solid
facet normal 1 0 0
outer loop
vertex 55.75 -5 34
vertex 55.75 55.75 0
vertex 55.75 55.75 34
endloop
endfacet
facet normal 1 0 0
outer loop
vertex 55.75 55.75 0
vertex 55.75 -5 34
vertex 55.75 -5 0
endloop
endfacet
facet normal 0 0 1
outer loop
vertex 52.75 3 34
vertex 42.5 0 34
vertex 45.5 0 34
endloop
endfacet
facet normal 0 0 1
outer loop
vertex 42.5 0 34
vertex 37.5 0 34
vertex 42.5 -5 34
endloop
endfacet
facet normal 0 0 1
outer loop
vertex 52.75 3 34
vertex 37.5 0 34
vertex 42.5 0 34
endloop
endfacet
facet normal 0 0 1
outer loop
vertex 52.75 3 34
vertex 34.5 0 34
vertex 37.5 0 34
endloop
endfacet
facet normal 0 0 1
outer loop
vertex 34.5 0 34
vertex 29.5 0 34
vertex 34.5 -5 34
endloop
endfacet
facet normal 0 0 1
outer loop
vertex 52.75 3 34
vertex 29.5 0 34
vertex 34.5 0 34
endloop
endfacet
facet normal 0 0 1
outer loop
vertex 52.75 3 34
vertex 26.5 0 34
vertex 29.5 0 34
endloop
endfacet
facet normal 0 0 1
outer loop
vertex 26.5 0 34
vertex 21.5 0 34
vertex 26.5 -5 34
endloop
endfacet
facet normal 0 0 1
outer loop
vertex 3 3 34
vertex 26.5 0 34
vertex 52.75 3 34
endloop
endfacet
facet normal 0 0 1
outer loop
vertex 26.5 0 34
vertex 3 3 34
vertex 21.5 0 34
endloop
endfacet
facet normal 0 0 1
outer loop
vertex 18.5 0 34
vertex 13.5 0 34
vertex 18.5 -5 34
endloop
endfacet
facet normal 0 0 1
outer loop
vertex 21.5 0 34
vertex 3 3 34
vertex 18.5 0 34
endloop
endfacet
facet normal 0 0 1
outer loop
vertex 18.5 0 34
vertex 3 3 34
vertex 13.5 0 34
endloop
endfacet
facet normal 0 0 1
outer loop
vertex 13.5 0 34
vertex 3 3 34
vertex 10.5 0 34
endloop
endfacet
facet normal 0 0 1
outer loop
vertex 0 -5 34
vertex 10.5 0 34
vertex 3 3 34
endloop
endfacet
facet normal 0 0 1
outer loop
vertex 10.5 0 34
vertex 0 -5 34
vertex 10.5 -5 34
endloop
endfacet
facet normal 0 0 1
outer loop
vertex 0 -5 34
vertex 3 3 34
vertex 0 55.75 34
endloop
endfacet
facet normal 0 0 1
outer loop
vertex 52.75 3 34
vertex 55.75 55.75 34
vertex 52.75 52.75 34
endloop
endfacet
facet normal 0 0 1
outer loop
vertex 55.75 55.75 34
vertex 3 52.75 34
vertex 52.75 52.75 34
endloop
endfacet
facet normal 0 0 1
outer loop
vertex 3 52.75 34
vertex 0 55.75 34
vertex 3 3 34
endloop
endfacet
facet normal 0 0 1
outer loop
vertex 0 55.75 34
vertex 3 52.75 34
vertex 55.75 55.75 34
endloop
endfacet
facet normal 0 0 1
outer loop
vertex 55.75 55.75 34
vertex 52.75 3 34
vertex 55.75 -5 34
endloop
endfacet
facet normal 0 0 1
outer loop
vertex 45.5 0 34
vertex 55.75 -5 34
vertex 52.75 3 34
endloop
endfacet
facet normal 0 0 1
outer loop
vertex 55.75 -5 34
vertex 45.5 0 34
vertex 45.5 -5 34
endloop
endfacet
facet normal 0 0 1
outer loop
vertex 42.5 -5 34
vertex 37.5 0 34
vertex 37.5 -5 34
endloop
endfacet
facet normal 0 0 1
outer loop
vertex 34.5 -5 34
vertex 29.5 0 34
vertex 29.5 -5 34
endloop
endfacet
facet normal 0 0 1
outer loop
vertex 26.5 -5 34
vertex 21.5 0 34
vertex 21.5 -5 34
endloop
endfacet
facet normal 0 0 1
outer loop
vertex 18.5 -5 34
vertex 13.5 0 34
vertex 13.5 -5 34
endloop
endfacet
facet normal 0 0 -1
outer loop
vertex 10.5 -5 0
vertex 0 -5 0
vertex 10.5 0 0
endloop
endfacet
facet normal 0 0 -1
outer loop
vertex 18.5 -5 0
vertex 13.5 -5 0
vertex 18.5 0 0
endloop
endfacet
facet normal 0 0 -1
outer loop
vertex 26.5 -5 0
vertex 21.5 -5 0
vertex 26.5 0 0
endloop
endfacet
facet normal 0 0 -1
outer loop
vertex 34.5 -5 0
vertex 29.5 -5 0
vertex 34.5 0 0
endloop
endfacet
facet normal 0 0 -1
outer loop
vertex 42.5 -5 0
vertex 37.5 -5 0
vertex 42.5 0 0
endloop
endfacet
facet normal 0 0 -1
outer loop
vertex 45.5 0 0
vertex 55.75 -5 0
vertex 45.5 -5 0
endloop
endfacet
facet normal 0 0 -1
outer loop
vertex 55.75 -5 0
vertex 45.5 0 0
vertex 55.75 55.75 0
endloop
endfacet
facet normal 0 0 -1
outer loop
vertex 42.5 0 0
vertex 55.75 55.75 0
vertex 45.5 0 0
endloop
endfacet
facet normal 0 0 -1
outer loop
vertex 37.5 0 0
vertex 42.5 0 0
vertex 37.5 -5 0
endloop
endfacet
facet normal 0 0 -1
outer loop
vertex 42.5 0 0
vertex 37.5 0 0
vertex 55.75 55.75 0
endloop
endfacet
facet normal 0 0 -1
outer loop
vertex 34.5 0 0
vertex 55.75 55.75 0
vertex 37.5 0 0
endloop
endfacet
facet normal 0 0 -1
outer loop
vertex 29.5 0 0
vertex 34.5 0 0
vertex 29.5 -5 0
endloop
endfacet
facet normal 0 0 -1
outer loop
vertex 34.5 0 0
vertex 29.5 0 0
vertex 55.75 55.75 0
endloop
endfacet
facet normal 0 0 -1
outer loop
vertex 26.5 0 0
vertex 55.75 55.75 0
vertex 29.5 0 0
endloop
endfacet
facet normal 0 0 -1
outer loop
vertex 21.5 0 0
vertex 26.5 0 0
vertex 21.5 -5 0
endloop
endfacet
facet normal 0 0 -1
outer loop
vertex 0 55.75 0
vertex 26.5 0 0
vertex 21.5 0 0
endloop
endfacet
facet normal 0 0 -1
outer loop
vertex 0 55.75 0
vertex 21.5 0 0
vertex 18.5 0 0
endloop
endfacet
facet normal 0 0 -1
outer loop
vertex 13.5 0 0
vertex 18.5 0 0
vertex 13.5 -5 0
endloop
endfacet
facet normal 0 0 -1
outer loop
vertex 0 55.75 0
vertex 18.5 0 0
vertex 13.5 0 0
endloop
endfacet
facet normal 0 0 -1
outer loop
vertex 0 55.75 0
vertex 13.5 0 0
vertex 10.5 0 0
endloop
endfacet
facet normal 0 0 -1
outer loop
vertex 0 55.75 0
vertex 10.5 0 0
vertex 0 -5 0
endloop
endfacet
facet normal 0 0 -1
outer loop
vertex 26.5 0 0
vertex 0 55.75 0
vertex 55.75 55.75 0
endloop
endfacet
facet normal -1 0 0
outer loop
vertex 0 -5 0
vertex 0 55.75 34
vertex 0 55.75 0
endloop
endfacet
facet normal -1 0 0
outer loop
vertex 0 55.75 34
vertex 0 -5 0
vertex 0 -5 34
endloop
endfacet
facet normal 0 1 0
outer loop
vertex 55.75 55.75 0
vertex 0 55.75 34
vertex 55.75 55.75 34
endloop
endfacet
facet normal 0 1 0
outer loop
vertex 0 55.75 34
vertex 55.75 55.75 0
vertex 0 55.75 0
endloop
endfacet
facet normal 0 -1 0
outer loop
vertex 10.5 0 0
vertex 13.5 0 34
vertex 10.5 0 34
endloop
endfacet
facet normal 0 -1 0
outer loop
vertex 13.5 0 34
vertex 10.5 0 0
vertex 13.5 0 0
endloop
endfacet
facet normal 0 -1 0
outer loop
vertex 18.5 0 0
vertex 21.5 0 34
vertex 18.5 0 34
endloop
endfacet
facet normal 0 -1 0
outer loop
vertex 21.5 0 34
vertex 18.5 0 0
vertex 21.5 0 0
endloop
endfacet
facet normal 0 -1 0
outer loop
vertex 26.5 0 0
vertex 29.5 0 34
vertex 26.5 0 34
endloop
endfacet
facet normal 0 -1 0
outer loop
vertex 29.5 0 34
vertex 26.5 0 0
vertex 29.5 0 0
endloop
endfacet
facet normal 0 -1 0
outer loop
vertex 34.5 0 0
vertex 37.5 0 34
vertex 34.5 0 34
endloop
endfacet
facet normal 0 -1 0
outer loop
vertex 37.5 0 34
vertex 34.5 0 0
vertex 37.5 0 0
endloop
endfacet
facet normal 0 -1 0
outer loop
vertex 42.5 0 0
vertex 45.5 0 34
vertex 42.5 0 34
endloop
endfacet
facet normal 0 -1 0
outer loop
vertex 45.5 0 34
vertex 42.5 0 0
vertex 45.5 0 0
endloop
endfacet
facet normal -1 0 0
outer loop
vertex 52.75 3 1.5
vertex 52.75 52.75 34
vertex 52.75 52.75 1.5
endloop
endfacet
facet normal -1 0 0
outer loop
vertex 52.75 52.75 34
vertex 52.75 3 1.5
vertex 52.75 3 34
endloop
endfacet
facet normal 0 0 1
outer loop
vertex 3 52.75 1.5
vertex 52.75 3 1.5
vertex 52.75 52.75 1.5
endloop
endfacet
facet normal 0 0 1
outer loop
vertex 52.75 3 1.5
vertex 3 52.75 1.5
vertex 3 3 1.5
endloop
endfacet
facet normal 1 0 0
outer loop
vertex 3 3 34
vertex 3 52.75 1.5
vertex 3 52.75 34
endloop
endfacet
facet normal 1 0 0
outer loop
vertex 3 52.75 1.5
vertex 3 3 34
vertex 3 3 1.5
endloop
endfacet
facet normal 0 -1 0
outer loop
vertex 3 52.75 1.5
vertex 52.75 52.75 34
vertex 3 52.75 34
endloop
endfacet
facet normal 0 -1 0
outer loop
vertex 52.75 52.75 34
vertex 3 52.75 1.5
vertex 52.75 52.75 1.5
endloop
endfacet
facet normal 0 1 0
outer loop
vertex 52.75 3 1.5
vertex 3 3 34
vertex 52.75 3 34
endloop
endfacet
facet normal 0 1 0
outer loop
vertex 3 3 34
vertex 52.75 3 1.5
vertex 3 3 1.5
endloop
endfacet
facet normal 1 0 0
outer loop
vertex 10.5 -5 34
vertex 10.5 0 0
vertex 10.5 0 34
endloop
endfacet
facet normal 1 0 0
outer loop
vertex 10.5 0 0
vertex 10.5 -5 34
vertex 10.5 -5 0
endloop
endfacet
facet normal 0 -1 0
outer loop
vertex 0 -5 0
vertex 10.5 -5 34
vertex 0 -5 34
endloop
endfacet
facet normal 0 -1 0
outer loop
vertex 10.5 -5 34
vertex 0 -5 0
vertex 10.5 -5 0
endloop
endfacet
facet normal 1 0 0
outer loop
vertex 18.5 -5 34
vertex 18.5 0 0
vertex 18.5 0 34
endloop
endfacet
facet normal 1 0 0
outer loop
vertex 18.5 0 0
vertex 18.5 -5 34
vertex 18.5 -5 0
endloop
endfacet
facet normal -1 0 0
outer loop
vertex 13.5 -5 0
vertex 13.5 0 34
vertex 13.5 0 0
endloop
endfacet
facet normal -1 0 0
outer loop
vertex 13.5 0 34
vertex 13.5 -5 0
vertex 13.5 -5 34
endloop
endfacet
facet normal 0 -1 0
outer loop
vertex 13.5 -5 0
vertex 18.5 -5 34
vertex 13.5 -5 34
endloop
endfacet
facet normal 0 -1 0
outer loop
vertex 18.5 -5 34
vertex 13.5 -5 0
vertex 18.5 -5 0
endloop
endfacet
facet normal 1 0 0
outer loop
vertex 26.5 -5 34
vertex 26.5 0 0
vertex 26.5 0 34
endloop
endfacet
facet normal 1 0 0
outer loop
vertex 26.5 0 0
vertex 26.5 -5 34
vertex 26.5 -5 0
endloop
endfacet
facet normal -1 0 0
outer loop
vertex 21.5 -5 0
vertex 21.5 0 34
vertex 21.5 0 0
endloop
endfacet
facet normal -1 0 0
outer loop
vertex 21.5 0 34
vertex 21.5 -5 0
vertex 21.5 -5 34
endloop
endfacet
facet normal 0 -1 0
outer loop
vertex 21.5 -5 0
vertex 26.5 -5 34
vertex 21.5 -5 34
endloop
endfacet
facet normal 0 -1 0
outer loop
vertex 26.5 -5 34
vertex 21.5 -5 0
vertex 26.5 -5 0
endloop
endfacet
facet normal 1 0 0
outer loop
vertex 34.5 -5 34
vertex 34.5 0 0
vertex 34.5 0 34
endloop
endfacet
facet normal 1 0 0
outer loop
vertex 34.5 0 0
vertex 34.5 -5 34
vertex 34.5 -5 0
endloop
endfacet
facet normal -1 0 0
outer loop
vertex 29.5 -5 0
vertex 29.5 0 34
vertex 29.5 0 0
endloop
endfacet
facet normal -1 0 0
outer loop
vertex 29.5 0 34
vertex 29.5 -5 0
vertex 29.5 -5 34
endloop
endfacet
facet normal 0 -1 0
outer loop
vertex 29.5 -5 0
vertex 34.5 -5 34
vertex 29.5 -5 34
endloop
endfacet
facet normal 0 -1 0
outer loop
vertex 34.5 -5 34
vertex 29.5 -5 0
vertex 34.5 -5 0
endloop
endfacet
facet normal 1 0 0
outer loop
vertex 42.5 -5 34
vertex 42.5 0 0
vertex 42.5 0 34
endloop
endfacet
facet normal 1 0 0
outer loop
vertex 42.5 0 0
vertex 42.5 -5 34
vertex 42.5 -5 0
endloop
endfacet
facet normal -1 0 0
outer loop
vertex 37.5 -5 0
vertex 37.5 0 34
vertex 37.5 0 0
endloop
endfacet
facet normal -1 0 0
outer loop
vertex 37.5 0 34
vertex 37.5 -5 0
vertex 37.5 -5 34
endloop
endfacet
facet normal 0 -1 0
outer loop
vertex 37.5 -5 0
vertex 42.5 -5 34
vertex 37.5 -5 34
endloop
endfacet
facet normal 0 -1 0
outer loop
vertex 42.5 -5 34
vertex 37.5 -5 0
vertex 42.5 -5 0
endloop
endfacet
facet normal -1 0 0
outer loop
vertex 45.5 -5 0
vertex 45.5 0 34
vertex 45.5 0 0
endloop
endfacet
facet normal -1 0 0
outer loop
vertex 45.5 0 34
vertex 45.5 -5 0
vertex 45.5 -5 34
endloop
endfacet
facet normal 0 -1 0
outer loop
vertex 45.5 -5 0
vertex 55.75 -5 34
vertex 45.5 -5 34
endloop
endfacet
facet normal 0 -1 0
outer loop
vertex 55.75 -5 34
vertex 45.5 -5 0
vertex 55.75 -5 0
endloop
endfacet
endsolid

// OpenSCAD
// file: ../Parts/rounder.scad
// rounder.scad
// cutting tool for rounding off corners with a cylinder

//---------------------
module rounder(
r=10,   // radius
h=10,   // height
f=22,    // $fn
extra=0.01  // extra size for the cube
){

difference(){
  translate([-extra,-extra,-extra])
  cube([r+extra,r+extra,h+2*extra]);
  translate([r,r,-1])
  cylinder(r=r,h=h+2,$fn=f);
}

}

//---------------------------------------------------------------------------
module bevel(x=1,y=1,h=10){

linear_extrude(height=h)
polygon(points=[[0,0],[x,0],[0,y]]);
    
}
  

//========================

rounder();

//========================
// main file
//======================================================================
// weightBench.scad
//
// DrTomFlint 17 Oct 2024
//
//======================================================================

use <../Parts/rounder.scad>

//----------------------------------------------------------------------
module foot(){
  
out=55.75;
hi=34;
thick=3.0;

  difference(){
    cube([out,out,hi]);
    translate([thick,thick,1.5])
    cube([out-2*thick,out-2*thick,hi]);
  }
  
  for(i=[0:5]){
    translate([5.5+8*i,-5,0])
    cube([5,5,hi]);
  }
  translate([0,-5,0])
  cube([6,5,hi]);
  translate([out-6,-5,0])
  cube([6,5,hi]);
  
}

//======================================================================

foot();

//======================================================================
